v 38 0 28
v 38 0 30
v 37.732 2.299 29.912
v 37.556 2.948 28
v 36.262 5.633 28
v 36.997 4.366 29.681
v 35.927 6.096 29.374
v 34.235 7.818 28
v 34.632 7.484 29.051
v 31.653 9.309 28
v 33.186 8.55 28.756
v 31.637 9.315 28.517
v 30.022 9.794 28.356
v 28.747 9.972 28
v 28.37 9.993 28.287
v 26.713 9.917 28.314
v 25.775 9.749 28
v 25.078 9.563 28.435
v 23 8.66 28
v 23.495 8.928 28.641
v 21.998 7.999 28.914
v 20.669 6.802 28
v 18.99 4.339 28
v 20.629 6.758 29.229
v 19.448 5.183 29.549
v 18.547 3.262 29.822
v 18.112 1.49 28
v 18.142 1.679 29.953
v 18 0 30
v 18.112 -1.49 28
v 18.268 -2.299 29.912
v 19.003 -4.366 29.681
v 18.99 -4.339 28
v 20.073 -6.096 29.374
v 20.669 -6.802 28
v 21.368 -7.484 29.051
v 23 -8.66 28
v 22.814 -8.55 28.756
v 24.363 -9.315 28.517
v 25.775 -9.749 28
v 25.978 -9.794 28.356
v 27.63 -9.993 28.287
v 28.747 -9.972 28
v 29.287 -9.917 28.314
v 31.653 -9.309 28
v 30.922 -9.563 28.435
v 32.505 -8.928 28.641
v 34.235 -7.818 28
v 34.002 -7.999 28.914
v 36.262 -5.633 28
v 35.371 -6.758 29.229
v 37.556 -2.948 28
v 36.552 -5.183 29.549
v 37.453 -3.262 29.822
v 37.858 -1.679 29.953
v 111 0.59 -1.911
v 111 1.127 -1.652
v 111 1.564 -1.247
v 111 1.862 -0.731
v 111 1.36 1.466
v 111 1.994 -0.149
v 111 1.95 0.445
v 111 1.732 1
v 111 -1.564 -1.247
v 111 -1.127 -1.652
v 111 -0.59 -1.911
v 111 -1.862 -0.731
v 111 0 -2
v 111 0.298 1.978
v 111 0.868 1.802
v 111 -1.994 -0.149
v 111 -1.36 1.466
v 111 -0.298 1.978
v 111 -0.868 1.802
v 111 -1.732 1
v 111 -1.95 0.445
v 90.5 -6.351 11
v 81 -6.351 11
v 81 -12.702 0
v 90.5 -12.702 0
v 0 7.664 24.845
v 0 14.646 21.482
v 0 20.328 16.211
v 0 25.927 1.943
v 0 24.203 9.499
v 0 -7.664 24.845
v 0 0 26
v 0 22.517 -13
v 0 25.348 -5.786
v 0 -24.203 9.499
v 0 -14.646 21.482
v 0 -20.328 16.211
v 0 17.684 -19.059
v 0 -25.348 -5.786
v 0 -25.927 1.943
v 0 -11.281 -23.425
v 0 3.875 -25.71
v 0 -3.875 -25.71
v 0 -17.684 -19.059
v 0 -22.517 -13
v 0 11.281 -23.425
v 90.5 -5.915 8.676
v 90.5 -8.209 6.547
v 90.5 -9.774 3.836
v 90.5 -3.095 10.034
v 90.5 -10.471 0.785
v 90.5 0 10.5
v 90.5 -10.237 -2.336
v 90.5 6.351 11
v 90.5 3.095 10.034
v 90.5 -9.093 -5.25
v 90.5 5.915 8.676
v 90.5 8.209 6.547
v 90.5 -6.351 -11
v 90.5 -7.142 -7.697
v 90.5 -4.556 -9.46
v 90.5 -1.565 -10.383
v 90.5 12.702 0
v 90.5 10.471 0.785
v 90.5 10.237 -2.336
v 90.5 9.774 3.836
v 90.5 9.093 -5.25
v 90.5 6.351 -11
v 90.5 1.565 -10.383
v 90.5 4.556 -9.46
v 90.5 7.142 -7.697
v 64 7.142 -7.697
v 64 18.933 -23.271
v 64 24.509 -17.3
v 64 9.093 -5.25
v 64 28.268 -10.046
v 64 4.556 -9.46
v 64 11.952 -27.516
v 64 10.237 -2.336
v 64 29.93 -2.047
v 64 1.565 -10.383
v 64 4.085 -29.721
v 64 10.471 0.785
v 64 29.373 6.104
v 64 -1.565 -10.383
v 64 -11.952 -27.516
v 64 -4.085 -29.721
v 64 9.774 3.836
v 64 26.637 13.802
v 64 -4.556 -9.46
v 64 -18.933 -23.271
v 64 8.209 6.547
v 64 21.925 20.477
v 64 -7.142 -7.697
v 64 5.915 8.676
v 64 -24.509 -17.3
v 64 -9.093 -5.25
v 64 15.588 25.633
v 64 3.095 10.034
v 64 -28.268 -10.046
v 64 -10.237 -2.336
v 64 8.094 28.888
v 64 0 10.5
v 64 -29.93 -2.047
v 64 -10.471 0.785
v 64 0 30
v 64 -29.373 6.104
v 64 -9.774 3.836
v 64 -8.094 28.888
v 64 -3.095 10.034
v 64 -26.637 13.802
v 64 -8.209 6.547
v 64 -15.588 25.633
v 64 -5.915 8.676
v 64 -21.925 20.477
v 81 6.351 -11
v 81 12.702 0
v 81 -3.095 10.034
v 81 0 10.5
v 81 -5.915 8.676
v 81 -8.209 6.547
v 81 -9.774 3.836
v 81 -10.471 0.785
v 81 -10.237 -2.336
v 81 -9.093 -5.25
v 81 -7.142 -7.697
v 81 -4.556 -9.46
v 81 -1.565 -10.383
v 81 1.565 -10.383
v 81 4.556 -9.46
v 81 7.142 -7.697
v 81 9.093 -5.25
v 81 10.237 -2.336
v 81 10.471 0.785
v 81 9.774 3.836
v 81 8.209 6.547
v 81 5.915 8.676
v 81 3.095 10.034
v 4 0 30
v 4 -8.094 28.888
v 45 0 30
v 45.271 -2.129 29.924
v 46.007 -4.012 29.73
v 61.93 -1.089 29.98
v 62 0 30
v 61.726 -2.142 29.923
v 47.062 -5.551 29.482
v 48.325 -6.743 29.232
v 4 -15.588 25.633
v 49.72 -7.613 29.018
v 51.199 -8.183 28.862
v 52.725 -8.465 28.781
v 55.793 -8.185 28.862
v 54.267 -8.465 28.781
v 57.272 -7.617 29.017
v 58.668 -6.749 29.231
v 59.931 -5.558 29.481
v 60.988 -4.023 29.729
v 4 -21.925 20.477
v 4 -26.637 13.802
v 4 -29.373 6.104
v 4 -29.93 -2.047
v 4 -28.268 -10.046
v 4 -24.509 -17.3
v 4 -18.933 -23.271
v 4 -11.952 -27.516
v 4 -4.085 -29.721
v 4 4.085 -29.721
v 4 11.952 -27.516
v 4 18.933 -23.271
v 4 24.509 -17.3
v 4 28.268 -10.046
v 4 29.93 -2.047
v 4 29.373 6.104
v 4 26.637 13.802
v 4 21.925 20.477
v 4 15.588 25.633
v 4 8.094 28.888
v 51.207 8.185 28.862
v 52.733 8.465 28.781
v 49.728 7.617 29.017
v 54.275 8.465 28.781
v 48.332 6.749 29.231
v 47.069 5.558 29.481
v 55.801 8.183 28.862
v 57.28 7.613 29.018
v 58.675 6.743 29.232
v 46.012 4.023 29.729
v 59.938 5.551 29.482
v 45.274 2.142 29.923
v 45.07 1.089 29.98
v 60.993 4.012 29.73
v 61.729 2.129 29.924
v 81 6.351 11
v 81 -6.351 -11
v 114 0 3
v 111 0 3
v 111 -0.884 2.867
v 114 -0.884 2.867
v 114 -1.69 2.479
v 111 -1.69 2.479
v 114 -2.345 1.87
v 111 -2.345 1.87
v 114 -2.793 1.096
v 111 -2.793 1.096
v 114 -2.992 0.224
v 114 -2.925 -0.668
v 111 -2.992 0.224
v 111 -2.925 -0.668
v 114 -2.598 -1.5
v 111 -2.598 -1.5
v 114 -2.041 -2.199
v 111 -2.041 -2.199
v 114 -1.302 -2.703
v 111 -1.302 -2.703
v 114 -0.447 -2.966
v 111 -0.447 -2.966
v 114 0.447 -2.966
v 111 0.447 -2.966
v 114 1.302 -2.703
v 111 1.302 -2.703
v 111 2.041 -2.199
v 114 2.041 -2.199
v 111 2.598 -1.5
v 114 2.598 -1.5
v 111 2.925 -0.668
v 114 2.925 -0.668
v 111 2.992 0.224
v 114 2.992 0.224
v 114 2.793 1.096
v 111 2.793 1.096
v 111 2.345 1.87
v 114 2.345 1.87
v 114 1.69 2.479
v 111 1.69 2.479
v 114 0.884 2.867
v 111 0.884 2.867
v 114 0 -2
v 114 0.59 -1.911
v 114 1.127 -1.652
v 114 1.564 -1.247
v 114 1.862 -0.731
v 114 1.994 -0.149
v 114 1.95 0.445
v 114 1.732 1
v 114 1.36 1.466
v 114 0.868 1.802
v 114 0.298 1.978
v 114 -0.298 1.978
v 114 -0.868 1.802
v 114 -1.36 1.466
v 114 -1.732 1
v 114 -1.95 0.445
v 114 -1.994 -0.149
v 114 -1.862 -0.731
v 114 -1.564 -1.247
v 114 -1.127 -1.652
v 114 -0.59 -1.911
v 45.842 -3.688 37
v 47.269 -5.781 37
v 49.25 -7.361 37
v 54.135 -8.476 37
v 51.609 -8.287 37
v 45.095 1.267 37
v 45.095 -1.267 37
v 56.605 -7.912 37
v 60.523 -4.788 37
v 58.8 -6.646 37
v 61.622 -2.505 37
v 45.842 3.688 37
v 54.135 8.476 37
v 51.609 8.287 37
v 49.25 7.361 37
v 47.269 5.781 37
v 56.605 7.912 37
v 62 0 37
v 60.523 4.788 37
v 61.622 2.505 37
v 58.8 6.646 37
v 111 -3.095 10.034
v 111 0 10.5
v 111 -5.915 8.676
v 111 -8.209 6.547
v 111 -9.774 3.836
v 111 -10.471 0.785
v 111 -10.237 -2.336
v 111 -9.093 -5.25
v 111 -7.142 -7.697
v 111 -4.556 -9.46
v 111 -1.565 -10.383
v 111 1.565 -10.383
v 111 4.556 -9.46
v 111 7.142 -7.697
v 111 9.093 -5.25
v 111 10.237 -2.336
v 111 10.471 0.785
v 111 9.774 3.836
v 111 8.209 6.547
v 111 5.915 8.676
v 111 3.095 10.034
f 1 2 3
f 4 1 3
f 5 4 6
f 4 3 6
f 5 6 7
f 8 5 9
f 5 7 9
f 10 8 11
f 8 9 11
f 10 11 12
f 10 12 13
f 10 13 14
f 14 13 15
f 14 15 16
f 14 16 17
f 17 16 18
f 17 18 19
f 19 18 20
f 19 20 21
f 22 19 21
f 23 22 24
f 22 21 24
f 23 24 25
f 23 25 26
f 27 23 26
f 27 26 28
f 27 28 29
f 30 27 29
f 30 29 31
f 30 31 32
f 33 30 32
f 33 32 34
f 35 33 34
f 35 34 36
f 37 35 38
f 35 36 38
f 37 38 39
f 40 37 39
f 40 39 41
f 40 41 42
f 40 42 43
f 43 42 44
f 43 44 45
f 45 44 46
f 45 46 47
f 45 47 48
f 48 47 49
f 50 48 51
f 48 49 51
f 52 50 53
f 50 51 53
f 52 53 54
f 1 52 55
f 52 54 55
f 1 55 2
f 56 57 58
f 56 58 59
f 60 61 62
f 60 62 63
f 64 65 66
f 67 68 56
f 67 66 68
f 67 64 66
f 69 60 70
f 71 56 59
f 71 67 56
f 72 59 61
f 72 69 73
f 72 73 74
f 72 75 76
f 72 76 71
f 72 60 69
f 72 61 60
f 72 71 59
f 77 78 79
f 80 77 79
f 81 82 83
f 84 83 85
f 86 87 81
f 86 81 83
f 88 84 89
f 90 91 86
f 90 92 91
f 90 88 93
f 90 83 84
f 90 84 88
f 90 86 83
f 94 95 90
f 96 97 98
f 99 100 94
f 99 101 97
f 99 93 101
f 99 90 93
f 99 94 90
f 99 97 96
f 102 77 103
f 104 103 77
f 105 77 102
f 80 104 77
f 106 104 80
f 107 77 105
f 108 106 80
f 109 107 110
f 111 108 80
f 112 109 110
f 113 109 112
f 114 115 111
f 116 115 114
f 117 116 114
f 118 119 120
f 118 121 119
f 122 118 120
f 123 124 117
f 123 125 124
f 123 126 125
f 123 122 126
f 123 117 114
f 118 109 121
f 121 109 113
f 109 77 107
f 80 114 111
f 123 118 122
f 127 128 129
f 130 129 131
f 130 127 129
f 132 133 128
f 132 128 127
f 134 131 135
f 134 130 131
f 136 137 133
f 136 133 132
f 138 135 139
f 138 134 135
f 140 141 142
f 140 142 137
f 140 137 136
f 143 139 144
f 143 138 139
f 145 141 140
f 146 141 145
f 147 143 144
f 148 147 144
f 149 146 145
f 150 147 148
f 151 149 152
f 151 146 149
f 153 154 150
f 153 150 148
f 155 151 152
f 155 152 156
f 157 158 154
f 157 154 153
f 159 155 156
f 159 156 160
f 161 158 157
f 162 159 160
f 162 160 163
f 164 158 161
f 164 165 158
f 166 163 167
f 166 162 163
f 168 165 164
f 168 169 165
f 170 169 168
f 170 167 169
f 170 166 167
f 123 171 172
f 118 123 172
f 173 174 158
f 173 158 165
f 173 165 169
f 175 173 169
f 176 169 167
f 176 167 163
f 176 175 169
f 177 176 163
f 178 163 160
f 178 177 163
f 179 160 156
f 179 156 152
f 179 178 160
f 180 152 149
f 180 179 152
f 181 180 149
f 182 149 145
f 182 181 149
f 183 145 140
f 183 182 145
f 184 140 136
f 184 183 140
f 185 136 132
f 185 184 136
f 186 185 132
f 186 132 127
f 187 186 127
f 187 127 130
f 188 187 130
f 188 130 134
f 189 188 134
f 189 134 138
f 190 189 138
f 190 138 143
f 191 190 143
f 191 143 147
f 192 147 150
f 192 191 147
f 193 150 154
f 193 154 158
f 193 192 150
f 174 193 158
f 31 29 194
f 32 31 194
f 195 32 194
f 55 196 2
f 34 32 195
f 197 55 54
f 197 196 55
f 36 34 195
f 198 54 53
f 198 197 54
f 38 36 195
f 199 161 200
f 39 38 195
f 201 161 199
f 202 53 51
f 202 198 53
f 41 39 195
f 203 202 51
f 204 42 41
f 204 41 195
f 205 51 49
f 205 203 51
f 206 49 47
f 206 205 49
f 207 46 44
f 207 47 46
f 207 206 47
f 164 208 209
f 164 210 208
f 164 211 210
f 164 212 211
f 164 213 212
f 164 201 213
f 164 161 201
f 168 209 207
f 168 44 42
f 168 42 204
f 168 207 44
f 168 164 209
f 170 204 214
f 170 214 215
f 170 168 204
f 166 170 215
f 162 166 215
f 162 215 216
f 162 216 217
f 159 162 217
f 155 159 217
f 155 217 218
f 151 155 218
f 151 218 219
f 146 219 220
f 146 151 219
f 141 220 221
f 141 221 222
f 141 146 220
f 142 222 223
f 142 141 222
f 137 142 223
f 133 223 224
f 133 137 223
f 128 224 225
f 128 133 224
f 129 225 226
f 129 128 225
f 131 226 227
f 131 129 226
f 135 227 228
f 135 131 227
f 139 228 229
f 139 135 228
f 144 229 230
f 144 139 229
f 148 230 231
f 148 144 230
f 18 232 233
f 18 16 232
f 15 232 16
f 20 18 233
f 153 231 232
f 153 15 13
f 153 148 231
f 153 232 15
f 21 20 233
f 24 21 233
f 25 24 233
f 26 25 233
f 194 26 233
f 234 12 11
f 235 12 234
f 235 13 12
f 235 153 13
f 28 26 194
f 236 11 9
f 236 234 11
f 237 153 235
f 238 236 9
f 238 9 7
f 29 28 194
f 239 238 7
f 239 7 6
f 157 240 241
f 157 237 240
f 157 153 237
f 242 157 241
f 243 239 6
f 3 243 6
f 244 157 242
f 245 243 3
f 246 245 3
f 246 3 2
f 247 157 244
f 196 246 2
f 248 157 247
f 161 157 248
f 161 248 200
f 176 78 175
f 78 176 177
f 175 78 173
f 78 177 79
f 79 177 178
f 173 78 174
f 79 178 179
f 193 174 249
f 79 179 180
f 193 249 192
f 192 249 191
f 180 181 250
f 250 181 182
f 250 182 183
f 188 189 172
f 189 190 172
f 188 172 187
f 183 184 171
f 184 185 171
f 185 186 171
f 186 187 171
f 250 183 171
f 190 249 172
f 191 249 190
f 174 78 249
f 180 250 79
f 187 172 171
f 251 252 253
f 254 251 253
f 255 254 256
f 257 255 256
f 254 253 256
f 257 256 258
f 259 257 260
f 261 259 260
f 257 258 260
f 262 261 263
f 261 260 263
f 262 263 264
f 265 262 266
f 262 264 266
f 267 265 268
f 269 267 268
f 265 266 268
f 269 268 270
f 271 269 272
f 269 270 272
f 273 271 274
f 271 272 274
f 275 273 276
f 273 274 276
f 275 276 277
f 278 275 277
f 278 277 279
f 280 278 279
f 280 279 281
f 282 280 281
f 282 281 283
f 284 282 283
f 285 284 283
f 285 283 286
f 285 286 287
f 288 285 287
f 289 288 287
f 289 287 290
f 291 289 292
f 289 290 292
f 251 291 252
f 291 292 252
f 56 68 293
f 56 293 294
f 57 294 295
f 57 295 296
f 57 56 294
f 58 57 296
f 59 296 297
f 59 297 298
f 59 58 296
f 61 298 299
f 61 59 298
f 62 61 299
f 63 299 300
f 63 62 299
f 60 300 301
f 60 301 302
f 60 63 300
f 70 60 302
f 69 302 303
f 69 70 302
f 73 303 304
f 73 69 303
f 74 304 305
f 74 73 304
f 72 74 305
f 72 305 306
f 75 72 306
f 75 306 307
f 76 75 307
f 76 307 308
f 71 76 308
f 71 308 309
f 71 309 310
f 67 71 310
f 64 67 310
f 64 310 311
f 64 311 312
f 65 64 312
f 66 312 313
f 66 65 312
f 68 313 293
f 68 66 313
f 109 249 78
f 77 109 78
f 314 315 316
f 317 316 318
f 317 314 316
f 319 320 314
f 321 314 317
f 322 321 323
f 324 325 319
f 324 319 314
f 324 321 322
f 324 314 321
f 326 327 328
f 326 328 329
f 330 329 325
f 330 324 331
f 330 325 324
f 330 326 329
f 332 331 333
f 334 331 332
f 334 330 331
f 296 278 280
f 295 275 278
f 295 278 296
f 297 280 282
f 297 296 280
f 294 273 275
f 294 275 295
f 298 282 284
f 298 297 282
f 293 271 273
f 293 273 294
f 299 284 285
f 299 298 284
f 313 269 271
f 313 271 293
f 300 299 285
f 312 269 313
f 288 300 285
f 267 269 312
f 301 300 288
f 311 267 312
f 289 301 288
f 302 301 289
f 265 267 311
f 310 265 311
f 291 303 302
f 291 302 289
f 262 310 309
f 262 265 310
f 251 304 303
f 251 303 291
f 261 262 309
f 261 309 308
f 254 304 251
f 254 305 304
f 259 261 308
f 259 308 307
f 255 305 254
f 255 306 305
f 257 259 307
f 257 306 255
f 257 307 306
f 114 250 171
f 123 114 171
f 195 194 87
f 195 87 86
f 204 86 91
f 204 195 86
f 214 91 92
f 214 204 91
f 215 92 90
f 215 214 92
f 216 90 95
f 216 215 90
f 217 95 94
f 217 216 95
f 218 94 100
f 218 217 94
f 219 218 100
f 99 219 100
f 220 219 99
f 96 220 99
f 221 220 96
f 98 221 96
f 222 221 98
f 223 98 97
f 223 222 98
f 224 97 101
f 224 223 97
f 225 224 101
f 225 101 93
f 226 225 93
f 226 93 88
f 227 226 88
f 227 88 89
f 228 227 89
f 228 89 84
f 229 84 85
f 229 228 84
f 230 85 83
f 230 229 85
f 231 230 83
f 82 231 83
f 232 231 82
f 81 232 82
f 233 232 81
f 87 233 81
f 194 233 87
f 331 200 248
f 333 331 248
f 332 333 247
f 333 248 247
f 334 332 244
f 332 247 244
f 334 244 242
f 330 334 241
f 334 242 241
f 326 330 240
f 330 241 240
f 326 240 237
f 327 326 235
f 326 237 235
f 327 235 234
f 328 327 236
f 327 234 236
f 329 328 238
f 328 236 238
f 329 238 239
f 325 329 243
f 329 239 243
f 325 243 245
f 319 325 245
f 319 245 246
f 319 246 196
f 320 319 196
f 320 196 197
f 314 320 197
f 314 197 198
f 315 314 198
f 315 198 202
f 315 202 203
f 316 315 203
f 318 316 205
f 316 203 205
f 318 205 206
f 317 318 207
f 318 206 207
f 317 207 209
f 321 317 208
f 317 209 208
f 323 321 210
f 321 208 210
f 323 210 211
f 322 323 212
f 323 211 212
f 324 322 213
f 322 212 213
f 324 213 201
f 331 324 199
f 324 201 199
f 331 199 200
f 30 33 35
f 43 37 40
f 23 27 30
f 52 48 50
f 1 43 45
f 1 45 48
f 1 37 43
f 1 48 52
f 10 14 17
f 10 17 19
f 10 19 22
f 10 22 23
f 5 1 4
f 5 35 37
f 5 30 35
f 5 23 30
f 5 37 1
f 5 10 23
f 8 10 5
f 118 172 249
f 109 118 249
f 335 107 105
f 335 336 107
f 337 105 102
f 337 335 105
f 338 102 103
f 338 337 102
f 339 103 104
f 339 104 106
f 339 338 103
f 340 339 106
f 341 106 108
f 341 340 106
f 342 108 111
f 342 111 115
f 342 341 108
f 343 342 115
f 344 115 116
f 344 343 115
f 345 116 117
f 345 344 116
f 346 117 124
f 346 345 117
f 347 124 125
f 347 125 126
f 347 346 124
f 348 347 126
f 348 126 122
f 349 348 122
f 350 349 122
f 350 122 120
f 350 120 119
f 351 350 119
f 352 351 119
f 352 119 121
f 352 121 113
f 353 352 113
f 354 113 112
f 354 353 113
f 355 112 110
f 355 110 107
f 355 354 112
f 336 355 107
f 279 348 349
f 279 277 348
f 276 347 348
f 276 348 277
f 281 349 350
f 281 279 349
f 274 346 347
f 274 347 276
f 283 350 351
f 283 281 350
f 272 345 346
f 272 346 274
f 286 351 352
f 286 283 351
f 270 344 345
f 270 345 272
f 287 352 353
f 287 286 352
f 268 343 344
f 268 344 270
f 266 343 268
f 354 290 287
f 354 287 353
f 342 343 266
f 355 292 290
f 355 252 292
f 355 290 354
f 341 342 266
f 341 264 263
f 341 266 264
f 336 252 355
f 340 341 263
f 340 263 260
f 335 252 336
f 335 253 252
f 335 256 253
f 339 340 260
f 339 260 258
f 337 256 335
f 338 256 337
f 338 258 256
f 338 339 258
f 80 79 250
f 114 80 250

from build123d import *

# Parameters (mm, degrees)
ZKOSEN_1_SIZE            = 4
SKICA2_R                 = 10
ODEBRAT_VYSUNUT_M1_DEPTH = 2
P_IDAT_VYSUNUT_M1_DEPTH  = 9.5
SKICA4_R                 = 3
SKICA4_R_2               = 2
P_IDAT_VYSUNUT_M2_DEPTH  = 3
SKICA5_R                 = 8.5
P_IDAT_VYSUNUT_M3_DEPTH  = 9


with BuildPart() as part:
    # Skica1 → Rotovat1 (revolve)
    with BuildSketch(Plane.XY, mode=Mode.PRIVATE) as rotovat1_sk:
        Polygon((0, 0), (0, 30), (64, 30), (64, 10.5), (111, 10.5), (111, 0), align=None)
    revolve(rotovat1_sk.sketch.rotate(Axis((0, 0, 0), (1, 0, 0)), 90), axis=Axis((0, 0, 0), (1, 0, 0)))

    # Zkosení1
    zkosen_1_edges = [part.edges().sort_by_distance(p)[0] for p in [
        (0, 0, -30),
    ]]
    chamfer(zkosen_1_edges, length=ZKOSEN_1_SIZE)

    # Skica2 → Odebrat vysunutím1 (cut)
    with BuildSketch(Plane.XY.offset(30)):
        with Locations((28, 0)):
            Circle(SKICA2_R)
    extrude(amount=-ODEBRAT_VYSUNUT_M1_DEPTH, mode=Mode.SUBTRACT)

    # Skica3 → Přidat vysunutím1 (add)
    with BuildSketch(Plane(origin=(81, 0, 0), x_dir=(0, 0, -1), z_dir=(1, 0, 0))):
        Polygon((0, 12.701705922), (-11, 6.350852961), (-11, -6.350852961), (0, -12.701705922), (11, -6.350852961), (11, 6.350852961), align=None)
    extrude(amount=P_IDAT_VYSUNUT_M1_DEPTH)

    # Skica4 → Přidat vysunutím2 (add)
    with BuildSketch(Plane(origin=(111, 0, 0), x_dir=(0, 0, -1), z_dir=(1, 0, 0))):
        with Locations(Location((0, 0, 0), (0, 0, 180))):
            Circle(SKICA4_R)
        Circle(SKICA4_R_2, mode=Mode.SUBTRACT)
    extrude(amount=P_IDAT_VYSUNUT_M2_DEPTH)

    # Skica5 → Přidat vysunutím3 (add)
    with BuildSketch(Plane.XY.offset(28)):
        with Locations((53.5, 0)):
            Circle(SKICA5_R)
    extrude(amount=P_IDAT_VYSUNUT_M3_DEPTH)


solid = part.part
